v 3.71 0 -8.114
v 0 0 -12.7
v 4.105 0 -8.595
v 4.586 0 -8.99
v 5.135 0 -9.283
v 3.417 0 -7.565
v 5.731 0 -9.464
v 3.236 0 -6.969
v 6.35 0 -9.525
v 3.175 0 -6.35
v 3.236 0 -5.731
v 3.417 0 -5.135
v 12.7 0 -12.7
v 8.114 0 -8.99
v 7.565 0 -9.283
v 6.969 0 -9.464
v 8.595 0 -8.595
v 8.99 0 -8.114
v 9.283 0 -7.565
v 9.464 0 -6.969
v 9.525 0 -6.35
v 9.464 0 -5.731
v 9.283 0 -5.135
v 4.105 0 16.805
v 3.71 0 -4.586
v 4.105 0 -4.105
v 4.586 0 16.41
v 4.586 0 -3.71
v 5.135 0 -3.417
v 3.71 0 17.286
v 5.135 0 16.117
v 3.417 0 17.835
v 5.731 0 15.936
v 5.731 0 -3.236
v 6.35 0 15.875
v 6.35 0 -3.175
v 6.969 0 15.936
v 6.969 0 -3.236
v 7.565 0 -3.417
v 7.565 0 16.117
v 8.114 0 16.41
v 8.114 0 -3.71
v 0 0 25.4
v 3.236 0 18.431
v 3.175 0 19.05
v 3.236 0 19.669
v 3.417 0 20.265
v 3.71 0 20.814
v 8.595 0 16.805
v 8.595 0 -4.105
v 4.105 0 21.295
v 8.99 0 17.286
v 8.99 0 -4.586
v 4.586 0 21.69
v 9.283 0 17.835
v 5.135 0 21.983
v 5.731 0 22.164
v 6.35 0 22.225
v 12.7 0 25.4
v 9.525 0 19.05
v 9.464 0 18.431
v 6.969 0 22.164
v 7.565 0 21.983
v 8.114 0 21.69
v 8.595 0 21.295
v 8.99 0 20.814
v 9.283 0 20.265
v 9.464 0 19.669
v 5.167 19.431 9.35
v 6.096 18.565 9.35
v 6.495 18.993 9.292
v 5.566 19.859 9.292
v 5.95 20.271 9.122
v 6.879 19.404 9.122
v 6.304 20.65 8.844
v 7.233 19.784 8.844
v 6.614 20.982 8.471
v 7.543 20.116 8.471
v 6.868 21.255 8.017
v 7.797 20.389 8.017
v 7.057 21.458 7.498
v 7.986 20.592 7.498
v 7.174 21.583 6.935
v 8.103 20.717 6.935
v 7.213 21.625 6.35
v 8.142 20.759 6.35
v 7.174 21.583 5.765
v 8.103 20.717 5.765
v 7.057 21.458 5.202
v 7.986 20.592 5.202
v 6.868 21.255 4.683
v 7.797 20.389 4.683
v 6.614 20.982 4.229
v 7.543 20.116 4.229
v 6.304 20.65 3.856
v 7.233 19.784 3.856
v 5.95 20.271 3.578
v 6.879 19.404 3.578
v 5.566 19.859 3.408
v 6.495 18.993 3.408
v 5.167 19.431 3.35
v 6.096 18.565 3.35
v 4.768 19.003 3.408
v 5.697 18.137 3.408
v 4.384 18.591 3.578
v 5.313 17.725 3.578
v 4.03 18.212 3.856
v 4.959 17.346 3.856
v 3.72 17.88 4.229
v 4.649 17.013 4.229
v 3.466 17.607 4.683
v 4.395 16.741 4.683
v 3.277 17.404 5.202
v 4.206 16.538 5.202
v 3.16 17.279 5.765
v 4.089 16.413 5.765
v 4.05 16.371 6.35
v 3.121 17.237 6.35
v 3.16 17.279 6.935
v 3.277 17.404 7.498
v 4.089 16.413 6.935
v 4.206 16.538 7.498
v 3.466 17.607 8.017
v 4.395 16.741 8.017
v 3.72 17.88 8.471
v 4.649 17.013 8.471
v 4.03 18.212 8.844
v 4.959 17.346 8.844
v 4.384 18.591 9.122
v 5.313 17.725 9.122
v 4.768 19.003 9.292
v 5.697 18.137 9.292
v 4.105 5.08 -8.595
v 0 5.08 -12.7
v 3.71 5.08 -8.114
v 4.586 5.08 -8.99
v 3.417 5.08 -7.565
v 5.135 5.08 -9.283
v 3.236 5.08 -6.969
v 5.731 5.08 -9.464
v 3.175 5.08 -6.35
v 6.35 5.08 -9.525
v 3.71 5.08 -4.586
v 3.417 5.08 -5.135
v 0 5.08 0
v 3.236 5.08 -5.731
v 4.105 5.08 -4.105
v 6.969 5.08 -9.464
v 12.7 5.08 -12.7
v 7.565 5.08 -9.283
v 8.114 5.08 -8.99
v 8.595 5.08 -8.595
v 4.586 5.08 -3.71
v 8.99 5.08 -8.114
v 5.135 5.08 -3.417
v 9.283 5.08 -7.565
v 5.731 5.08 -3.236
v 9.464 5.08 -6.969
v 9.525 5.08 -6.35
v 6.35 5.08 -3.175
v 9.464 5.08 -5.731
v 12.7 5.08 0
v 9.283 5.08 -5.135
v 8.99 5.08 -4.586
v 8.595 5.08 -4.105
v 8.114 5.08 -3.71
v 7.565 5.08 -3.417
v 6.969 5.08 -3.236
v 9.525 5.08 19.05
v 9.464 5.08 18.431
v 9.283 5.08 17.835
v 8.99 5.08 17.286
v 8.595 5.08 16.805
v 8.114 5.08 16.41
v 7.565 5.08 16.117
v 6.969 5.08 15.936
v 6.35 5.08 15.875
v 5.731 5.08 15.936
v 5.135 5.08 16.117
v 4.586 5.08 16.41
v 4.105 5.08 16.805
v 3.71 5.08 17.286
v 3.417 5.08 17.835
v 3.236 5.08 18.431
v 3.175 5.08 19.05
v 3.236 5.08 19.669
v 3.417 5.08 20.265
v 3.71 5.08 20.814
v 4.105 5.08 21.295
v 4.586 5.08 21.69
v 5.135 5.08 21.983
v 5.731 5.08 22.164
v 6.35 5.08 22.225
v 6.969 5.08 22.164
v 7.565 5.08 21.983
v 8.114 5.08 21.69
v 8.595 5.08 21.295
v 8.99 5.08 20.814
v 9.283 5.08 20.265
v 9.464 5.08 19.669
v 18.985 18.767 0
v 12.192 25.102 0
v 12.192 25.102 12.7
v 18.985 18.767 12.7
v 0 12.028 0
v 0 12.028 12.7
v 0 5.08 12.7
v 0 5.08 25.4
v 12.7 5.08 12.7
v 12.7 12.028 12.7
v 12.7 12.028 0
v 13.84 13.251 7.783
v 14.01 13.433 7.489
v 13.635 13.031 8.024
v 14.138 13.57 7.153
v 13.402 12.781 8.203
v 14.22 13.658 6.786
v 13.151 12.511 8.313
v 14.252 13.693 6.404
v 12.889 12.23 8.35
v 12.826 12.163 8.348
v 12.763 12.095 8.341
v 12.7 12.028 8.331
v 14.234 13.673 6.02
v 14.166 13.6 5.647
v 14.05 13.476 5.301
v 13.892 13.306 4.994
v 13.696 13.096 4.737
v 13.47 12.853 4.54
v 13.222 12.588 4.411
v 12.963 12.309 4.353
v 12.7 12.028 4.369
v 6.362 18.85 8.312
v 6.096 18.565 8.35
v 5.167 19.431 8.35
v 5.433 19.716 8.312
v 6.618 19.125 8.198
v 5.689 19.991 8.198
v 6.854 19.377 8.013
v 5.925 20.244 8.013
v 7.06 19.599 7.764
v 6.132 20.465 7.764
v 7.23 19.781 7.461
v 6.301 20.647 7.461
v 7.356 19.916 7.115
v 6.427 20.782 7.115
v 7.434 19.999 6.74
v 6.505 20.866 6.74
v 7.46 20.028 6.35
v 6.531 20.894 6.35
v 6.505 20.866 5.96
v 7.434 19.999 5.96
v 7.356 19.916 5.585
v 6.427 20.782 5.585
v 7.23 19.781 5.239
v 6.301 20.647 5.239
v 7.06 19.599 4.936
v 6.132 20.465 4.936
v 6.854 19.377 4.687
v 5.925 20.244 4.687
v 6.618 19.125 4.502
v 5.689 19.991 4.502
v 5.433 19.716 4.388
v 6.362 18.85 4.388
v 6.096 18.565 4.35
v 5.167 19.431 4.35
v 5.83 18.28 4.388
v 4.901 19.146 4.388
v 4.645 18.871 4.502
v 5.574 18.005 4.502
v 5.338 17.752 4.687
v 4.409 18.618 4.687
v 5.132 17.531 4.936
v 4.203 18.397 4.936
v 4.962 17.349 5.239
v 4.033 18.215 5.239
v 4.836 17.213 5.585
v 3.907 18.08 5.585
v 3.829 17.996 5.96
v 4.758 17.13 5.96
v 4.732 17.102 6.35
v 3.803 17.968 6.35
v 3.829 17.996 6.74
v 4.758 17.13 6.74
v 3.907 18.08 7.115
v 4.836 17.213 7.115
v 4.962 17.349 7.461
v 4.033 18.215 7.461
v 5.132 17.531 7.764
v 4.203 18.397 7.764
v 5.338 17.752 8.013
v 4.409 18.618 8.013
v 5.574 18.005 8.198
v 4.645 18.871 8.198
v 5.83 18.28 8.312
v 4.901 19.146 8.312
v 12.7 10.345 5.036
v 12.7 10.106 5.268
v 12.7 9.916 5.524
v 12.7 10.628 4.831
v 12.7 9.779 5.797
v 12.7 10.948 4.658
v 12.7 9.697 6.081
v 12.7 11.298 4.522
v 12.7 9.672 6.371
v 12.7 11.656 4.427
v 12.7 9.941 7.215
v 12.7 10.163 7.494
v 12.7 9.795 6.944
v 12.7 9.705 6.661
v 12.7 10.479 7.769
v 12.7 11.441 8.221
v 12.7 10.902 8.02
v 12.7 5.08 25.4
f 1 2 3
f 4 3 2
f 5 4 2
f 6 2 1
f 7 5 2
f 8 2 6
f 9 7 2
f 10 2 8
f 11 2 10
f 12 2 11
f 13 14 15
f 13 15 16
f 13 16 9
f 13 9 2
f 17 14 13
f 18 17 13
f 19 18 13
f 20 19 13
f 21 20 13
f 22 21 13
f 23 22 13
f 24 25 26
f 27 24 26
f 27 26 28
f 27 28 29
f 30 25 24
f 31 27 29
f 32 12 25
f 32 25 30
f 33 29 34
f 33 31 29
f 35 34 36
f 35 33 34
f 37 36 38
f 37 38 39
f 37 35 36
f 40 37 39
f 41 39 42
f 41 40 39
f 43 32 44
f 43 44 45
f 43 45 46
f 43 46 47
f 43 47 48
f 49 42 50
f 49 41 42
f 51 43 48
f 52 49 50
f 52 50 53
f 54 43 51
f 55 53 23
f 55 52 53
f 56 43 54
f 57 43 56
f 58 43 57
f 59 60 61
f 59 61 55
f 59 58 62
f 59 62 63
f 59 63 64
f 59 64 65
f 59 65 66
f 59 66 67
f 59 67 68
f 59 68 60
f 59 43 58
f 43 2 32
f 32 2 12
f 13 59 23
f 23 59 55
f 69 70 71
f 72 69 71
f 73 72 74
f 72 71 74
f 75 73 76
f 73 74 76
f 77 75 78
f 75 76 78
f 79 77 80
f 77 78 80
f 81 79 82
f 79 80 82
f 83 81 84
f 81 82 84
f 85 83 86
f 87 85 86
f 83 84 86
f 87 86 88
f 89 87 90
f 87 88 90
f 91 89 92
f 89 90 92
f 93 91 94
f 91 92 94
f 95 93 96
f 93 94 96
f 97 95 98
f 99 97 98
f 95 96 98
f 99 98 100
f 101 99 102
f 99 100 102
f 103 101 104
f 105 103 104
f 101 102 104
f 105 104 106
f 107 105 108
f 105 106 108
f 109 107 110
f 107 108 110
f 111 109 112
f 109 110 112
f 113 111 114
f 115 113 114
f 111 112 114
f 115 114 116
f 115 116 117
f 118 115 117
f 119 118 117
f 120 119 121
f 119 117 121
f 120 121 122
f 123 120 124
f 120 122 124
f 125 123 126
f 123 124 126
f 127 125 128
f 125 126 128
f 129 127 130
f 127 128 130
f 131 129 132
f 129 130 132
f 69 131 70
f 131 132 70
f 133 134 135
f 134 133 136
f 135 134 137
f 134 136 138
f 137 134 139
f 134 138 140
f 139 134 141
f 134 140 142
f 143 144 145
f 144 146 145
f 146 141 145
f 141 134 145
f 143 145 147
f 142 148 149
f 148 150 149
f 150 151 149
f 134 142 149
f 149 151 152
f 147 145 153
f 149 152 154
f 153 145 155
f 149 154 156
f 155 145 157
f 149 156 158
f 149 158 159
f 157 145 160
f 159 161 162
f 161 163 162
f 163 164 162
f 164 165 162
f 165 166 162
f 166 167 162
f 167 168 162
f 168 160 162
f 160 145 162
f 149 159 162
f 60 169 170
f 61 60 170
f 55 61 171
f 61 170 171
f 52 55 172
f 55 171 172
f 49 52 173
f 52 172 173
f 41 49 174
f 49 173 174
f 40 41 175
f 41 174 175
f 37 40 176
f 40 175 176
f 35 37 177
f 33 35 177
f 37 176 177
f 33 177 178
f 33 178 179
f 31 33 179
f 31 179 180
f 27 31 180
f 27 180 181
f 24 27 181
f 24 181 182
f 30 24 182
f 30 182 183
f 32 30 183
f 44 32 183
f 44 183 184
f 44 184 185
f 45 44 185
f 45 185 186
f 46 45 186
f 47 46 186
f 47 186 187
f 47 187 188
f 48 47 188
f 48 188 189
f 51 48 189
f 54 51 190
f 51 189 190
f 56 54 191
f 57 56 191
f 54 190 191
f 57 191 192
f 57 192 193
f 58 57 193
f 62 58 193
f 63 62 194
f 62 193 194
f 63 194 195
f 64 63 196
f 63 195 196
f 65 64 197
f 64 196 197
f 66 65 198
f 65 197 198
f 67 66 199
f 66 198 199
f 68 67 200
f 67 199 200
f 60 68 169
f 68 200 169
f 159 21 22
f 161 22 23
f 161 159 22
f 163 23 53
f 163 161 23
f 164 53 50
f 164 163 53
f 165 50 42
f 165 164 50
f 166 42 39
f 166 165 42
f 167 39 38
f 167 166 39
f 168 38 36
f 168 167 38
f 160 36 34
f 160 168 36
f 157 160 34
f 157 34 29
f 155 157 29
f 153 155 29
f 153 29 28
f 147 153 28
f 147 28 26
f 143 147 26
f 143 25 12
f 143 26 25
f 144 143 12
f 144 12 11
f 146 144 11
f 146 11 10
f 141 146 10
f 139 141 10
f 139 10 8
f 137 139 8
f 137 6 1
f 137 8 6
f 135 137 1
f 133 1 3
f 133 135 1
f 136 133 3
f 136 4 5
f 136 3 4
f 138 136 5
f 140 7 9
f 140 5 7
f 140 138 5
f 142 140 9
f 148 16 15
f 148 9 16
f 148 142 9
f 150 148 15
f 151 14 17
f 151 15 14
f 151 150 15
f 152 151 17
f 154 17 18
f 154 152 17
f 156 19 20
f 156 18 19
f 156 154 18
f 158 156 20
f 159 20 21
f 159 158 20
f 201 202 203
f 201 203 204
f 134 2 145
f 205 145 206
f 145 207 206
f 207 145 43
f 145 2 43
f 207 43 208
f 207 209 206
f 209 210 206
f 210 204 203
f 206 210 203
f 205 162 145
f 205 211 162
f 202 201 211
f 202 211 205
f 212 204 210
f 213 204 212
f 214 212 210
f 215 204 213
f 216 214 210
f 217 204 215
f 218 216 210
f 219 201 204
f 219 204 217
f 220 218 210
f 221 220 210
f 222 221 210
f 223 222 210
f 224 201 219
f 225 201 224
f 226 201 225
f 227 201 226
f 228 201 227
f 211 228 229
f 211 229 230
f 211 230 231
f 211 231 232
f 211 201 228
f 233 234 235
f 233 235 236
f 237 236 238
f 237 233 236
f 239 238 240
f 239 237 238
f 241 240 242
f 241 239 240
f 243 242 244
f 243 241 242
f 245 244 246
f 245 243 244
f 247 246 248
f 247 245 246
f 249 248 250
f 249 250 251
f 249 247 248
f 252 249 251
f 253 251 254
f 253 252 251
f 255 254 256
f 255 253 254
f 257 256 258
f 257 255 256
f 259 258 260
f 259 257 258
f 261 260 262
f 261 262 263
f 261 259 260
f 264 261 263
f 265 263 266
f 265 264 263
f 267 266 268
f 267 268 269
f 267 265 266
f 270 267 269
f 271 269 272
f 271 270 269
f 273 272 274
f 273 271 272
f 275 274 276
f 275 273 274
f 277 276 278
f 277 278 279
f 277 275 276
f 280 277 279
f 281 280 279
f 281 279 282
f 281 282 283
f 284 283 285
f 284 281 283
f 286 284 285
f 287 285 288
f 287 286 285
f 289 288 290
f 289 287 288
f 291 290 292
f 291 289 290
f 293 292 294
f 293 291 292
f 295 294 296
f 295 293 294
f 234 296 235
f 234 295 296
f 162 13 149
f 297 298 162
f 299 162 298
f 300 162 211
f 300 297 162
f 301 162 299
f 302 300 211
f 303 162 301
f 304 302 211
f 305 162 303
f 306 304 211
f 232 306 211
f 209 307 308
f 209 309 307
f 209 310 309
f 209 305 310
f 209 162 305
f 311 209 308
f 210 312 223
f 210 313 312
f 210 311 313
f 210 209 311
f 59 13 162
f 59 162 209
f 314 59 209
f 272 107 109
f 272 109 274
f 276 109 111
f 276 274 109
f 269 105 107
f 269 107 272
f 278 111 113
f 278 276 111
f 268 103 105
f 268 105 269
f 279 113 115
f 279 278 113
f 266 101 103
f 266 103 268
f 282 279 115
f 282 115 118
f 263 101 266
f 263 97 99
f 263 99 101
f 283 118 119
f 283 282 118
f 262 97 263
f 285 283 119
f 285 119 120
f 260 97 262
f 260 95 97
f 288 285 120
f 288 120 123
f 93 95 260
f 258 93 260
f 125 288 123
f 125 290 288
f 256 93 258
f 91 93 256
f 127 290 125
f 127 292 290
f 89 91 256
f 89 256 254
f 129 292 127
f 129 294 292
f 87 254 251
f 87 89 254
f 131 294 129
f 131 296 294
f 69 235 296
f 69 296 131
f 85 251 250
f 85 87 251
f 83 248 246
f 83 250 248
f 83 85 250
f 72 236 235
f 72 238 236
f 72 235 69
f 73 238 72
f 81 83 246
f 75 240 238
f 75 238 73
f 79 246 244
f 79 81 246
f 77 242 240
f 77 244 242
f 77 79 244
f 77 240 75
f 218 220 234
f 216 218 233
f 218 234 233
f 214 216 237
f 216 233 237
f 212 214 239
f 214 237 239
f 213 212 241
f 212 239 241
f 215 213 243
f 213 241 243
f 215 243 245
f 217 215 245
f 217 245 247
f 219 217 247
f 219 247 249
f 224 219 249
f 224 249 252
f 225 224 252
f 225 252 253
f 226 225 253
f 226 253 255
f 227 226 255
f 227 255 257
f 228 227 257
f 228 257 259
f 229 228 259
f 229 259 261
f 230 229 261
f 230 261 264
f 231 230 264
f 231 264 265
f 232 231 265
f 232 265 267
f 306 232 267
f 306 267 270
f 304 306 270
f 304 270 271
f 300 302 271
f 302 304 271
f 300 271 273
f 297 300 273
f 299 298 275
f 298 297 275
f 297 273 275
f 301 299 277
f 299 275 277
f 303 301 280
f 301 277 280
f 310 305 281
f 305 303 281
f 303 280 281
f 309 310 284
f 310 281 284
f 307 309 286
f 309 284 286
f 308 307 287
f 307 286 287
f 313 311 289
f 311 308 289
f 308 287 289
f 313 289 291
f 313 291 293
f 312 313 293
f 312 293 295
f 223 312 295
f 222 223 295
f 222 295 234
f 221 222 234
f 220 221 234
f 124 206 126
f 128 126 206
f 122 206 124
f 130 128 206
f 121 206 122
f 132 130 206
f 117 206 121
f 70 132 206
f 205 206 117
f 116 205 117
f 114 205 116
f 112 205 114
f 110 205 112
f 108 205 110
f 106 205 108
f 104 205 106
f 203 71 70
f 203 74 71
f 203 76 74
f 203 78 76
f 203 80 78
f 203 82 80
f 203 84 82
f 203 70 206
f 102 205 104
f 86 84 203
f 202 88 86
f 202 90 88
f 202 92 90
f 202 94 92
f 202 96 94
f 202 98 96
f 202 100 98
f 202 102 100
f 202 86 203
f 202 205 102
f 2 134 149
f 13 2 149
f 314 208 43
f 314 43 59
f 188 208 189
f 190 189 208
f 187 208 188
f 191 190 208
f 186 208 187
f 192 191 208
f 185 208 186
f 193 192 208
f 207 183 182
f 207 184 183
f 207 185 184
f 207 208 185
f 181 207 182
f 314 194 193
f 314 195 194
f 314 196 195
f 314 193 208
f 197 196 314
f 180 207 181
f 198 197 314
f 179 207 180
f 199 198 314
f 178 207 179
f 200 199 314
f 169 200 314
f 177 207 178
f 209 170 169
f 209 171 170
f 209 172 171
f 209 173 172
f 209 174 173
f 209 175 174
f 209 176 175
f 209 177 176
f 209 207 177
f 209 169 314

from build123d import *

# Parameters (mm, degrees)
BOSS_EXTRUDE3_DEPTH = 12.7
SKETCH8_R           = 2
CUT_EXTRUDE5_DEPTH  = 12.7
CUT_EXTRUDE7_DEPTH  = 12.7
SKETCH10_W          = 12.7
SKETCH10_H          = 5.08
BOSS_EXTRUDE4_DEPTH = 12.7
SKETCH11_R          = 3.175
CUT_EXTRUDE8_DEPTH  = 12.7
SKETCH13_R          = 3
SKETCH13_R_2        = 2
BOSS_EXTRUDE5_DEPTH = 1.27


with BuildPart() as part:
    # Sketch7 → Boss-Extrude3 (new body)
    with BuildSketch(Plane.XY):
        Polygon((0, 12.027702426), (12.192, 25.102021739), (24.892, 25.102021739), (12.7, 12.027702426), (12.7, 0), (0, 0), align=None)
    extrude(amount=BOSS_EXTRUDE3_DEPTH)

    # Sketch8 → Cut-Extrude5 (cut)
    with BuildSketch(Plane(origin=(-5.999201774, 5.594346159, 0), x_dir=(0, 0, 1), z_dir=(-0.731353702, 0.68199836, 0))):
        with Locations((6.35, 17.734942607)):
            Circle(SKETCH8_R)
    extrude(amount=-CUT_EXTRUDE5_DEPTH, mode=Mode.SUBTRACT)

    # Sketch9 → Cut-Extrude7 (cut)
    with BuildSketch(Plane.XY.offset(12.7)):
        Polygon((12.192, 25.102021739), (18.984953608, 18.76749002), (24.892, 25.102021739), align=None)
    extrude(amount=-CUT_EXTRUDE7_DEPTH, mode=Mode.SUBTRACT)

    # Sketch10 → Boss-Extrude4 (add)
    with BuildSketch(Plane.XY.offset(12.7)):
        with Locations((6.35, 2.54)):
            Rectangle(SKETCH10_W, SKETCH10_H)
    boss_extrude4 = extrude(amount=BOSS_EXTRUDE4_DEPTH)

    # Sketch11 → Cut-Extrude8 (cut)
    with BuildSketch(Plane(origin=(0, 5.08, 0), x_dir=(1, 0, 0), z_dir=(0, 1, 0))):
        with Locations((6.35, -19.05)):
            Circle(SKETCH11_R)
    cut_extrude8 = extrude(amount=-CUT_EXTRUDE8_DEPTH, mode=Mode.SUBTRACT)

    # Mirror2: Boss-Extrude4, Cut-Extrude8 across plane
    add(boss_extrude4.mirror(Plane.XY.offset(6.35)))
    add(cut_extrude8.mirror(Plane.XY.offset(6.35)), mode=Mode.SUBTRACT)

    # Sketch13 → Boss-Extrude5 (add)
    with BuildSketch(Plane(origin=(-5.999201774, 5.594346159, 0), x_dir=(0, 0, 1), z_dir=(-0.731353702, 0.68199836, 0))):
        with Locations((6.35, 17.734942607)):
            Circle(SKETCH13_R)
        with Locations((6.35, 17.734942607)):
            Circle(SKETCH13_R_2, mode=Mode.SUBTRACT)
    extrude(amount=BOSS_EXTRUDE5_DEPTH)


solid = part.part
